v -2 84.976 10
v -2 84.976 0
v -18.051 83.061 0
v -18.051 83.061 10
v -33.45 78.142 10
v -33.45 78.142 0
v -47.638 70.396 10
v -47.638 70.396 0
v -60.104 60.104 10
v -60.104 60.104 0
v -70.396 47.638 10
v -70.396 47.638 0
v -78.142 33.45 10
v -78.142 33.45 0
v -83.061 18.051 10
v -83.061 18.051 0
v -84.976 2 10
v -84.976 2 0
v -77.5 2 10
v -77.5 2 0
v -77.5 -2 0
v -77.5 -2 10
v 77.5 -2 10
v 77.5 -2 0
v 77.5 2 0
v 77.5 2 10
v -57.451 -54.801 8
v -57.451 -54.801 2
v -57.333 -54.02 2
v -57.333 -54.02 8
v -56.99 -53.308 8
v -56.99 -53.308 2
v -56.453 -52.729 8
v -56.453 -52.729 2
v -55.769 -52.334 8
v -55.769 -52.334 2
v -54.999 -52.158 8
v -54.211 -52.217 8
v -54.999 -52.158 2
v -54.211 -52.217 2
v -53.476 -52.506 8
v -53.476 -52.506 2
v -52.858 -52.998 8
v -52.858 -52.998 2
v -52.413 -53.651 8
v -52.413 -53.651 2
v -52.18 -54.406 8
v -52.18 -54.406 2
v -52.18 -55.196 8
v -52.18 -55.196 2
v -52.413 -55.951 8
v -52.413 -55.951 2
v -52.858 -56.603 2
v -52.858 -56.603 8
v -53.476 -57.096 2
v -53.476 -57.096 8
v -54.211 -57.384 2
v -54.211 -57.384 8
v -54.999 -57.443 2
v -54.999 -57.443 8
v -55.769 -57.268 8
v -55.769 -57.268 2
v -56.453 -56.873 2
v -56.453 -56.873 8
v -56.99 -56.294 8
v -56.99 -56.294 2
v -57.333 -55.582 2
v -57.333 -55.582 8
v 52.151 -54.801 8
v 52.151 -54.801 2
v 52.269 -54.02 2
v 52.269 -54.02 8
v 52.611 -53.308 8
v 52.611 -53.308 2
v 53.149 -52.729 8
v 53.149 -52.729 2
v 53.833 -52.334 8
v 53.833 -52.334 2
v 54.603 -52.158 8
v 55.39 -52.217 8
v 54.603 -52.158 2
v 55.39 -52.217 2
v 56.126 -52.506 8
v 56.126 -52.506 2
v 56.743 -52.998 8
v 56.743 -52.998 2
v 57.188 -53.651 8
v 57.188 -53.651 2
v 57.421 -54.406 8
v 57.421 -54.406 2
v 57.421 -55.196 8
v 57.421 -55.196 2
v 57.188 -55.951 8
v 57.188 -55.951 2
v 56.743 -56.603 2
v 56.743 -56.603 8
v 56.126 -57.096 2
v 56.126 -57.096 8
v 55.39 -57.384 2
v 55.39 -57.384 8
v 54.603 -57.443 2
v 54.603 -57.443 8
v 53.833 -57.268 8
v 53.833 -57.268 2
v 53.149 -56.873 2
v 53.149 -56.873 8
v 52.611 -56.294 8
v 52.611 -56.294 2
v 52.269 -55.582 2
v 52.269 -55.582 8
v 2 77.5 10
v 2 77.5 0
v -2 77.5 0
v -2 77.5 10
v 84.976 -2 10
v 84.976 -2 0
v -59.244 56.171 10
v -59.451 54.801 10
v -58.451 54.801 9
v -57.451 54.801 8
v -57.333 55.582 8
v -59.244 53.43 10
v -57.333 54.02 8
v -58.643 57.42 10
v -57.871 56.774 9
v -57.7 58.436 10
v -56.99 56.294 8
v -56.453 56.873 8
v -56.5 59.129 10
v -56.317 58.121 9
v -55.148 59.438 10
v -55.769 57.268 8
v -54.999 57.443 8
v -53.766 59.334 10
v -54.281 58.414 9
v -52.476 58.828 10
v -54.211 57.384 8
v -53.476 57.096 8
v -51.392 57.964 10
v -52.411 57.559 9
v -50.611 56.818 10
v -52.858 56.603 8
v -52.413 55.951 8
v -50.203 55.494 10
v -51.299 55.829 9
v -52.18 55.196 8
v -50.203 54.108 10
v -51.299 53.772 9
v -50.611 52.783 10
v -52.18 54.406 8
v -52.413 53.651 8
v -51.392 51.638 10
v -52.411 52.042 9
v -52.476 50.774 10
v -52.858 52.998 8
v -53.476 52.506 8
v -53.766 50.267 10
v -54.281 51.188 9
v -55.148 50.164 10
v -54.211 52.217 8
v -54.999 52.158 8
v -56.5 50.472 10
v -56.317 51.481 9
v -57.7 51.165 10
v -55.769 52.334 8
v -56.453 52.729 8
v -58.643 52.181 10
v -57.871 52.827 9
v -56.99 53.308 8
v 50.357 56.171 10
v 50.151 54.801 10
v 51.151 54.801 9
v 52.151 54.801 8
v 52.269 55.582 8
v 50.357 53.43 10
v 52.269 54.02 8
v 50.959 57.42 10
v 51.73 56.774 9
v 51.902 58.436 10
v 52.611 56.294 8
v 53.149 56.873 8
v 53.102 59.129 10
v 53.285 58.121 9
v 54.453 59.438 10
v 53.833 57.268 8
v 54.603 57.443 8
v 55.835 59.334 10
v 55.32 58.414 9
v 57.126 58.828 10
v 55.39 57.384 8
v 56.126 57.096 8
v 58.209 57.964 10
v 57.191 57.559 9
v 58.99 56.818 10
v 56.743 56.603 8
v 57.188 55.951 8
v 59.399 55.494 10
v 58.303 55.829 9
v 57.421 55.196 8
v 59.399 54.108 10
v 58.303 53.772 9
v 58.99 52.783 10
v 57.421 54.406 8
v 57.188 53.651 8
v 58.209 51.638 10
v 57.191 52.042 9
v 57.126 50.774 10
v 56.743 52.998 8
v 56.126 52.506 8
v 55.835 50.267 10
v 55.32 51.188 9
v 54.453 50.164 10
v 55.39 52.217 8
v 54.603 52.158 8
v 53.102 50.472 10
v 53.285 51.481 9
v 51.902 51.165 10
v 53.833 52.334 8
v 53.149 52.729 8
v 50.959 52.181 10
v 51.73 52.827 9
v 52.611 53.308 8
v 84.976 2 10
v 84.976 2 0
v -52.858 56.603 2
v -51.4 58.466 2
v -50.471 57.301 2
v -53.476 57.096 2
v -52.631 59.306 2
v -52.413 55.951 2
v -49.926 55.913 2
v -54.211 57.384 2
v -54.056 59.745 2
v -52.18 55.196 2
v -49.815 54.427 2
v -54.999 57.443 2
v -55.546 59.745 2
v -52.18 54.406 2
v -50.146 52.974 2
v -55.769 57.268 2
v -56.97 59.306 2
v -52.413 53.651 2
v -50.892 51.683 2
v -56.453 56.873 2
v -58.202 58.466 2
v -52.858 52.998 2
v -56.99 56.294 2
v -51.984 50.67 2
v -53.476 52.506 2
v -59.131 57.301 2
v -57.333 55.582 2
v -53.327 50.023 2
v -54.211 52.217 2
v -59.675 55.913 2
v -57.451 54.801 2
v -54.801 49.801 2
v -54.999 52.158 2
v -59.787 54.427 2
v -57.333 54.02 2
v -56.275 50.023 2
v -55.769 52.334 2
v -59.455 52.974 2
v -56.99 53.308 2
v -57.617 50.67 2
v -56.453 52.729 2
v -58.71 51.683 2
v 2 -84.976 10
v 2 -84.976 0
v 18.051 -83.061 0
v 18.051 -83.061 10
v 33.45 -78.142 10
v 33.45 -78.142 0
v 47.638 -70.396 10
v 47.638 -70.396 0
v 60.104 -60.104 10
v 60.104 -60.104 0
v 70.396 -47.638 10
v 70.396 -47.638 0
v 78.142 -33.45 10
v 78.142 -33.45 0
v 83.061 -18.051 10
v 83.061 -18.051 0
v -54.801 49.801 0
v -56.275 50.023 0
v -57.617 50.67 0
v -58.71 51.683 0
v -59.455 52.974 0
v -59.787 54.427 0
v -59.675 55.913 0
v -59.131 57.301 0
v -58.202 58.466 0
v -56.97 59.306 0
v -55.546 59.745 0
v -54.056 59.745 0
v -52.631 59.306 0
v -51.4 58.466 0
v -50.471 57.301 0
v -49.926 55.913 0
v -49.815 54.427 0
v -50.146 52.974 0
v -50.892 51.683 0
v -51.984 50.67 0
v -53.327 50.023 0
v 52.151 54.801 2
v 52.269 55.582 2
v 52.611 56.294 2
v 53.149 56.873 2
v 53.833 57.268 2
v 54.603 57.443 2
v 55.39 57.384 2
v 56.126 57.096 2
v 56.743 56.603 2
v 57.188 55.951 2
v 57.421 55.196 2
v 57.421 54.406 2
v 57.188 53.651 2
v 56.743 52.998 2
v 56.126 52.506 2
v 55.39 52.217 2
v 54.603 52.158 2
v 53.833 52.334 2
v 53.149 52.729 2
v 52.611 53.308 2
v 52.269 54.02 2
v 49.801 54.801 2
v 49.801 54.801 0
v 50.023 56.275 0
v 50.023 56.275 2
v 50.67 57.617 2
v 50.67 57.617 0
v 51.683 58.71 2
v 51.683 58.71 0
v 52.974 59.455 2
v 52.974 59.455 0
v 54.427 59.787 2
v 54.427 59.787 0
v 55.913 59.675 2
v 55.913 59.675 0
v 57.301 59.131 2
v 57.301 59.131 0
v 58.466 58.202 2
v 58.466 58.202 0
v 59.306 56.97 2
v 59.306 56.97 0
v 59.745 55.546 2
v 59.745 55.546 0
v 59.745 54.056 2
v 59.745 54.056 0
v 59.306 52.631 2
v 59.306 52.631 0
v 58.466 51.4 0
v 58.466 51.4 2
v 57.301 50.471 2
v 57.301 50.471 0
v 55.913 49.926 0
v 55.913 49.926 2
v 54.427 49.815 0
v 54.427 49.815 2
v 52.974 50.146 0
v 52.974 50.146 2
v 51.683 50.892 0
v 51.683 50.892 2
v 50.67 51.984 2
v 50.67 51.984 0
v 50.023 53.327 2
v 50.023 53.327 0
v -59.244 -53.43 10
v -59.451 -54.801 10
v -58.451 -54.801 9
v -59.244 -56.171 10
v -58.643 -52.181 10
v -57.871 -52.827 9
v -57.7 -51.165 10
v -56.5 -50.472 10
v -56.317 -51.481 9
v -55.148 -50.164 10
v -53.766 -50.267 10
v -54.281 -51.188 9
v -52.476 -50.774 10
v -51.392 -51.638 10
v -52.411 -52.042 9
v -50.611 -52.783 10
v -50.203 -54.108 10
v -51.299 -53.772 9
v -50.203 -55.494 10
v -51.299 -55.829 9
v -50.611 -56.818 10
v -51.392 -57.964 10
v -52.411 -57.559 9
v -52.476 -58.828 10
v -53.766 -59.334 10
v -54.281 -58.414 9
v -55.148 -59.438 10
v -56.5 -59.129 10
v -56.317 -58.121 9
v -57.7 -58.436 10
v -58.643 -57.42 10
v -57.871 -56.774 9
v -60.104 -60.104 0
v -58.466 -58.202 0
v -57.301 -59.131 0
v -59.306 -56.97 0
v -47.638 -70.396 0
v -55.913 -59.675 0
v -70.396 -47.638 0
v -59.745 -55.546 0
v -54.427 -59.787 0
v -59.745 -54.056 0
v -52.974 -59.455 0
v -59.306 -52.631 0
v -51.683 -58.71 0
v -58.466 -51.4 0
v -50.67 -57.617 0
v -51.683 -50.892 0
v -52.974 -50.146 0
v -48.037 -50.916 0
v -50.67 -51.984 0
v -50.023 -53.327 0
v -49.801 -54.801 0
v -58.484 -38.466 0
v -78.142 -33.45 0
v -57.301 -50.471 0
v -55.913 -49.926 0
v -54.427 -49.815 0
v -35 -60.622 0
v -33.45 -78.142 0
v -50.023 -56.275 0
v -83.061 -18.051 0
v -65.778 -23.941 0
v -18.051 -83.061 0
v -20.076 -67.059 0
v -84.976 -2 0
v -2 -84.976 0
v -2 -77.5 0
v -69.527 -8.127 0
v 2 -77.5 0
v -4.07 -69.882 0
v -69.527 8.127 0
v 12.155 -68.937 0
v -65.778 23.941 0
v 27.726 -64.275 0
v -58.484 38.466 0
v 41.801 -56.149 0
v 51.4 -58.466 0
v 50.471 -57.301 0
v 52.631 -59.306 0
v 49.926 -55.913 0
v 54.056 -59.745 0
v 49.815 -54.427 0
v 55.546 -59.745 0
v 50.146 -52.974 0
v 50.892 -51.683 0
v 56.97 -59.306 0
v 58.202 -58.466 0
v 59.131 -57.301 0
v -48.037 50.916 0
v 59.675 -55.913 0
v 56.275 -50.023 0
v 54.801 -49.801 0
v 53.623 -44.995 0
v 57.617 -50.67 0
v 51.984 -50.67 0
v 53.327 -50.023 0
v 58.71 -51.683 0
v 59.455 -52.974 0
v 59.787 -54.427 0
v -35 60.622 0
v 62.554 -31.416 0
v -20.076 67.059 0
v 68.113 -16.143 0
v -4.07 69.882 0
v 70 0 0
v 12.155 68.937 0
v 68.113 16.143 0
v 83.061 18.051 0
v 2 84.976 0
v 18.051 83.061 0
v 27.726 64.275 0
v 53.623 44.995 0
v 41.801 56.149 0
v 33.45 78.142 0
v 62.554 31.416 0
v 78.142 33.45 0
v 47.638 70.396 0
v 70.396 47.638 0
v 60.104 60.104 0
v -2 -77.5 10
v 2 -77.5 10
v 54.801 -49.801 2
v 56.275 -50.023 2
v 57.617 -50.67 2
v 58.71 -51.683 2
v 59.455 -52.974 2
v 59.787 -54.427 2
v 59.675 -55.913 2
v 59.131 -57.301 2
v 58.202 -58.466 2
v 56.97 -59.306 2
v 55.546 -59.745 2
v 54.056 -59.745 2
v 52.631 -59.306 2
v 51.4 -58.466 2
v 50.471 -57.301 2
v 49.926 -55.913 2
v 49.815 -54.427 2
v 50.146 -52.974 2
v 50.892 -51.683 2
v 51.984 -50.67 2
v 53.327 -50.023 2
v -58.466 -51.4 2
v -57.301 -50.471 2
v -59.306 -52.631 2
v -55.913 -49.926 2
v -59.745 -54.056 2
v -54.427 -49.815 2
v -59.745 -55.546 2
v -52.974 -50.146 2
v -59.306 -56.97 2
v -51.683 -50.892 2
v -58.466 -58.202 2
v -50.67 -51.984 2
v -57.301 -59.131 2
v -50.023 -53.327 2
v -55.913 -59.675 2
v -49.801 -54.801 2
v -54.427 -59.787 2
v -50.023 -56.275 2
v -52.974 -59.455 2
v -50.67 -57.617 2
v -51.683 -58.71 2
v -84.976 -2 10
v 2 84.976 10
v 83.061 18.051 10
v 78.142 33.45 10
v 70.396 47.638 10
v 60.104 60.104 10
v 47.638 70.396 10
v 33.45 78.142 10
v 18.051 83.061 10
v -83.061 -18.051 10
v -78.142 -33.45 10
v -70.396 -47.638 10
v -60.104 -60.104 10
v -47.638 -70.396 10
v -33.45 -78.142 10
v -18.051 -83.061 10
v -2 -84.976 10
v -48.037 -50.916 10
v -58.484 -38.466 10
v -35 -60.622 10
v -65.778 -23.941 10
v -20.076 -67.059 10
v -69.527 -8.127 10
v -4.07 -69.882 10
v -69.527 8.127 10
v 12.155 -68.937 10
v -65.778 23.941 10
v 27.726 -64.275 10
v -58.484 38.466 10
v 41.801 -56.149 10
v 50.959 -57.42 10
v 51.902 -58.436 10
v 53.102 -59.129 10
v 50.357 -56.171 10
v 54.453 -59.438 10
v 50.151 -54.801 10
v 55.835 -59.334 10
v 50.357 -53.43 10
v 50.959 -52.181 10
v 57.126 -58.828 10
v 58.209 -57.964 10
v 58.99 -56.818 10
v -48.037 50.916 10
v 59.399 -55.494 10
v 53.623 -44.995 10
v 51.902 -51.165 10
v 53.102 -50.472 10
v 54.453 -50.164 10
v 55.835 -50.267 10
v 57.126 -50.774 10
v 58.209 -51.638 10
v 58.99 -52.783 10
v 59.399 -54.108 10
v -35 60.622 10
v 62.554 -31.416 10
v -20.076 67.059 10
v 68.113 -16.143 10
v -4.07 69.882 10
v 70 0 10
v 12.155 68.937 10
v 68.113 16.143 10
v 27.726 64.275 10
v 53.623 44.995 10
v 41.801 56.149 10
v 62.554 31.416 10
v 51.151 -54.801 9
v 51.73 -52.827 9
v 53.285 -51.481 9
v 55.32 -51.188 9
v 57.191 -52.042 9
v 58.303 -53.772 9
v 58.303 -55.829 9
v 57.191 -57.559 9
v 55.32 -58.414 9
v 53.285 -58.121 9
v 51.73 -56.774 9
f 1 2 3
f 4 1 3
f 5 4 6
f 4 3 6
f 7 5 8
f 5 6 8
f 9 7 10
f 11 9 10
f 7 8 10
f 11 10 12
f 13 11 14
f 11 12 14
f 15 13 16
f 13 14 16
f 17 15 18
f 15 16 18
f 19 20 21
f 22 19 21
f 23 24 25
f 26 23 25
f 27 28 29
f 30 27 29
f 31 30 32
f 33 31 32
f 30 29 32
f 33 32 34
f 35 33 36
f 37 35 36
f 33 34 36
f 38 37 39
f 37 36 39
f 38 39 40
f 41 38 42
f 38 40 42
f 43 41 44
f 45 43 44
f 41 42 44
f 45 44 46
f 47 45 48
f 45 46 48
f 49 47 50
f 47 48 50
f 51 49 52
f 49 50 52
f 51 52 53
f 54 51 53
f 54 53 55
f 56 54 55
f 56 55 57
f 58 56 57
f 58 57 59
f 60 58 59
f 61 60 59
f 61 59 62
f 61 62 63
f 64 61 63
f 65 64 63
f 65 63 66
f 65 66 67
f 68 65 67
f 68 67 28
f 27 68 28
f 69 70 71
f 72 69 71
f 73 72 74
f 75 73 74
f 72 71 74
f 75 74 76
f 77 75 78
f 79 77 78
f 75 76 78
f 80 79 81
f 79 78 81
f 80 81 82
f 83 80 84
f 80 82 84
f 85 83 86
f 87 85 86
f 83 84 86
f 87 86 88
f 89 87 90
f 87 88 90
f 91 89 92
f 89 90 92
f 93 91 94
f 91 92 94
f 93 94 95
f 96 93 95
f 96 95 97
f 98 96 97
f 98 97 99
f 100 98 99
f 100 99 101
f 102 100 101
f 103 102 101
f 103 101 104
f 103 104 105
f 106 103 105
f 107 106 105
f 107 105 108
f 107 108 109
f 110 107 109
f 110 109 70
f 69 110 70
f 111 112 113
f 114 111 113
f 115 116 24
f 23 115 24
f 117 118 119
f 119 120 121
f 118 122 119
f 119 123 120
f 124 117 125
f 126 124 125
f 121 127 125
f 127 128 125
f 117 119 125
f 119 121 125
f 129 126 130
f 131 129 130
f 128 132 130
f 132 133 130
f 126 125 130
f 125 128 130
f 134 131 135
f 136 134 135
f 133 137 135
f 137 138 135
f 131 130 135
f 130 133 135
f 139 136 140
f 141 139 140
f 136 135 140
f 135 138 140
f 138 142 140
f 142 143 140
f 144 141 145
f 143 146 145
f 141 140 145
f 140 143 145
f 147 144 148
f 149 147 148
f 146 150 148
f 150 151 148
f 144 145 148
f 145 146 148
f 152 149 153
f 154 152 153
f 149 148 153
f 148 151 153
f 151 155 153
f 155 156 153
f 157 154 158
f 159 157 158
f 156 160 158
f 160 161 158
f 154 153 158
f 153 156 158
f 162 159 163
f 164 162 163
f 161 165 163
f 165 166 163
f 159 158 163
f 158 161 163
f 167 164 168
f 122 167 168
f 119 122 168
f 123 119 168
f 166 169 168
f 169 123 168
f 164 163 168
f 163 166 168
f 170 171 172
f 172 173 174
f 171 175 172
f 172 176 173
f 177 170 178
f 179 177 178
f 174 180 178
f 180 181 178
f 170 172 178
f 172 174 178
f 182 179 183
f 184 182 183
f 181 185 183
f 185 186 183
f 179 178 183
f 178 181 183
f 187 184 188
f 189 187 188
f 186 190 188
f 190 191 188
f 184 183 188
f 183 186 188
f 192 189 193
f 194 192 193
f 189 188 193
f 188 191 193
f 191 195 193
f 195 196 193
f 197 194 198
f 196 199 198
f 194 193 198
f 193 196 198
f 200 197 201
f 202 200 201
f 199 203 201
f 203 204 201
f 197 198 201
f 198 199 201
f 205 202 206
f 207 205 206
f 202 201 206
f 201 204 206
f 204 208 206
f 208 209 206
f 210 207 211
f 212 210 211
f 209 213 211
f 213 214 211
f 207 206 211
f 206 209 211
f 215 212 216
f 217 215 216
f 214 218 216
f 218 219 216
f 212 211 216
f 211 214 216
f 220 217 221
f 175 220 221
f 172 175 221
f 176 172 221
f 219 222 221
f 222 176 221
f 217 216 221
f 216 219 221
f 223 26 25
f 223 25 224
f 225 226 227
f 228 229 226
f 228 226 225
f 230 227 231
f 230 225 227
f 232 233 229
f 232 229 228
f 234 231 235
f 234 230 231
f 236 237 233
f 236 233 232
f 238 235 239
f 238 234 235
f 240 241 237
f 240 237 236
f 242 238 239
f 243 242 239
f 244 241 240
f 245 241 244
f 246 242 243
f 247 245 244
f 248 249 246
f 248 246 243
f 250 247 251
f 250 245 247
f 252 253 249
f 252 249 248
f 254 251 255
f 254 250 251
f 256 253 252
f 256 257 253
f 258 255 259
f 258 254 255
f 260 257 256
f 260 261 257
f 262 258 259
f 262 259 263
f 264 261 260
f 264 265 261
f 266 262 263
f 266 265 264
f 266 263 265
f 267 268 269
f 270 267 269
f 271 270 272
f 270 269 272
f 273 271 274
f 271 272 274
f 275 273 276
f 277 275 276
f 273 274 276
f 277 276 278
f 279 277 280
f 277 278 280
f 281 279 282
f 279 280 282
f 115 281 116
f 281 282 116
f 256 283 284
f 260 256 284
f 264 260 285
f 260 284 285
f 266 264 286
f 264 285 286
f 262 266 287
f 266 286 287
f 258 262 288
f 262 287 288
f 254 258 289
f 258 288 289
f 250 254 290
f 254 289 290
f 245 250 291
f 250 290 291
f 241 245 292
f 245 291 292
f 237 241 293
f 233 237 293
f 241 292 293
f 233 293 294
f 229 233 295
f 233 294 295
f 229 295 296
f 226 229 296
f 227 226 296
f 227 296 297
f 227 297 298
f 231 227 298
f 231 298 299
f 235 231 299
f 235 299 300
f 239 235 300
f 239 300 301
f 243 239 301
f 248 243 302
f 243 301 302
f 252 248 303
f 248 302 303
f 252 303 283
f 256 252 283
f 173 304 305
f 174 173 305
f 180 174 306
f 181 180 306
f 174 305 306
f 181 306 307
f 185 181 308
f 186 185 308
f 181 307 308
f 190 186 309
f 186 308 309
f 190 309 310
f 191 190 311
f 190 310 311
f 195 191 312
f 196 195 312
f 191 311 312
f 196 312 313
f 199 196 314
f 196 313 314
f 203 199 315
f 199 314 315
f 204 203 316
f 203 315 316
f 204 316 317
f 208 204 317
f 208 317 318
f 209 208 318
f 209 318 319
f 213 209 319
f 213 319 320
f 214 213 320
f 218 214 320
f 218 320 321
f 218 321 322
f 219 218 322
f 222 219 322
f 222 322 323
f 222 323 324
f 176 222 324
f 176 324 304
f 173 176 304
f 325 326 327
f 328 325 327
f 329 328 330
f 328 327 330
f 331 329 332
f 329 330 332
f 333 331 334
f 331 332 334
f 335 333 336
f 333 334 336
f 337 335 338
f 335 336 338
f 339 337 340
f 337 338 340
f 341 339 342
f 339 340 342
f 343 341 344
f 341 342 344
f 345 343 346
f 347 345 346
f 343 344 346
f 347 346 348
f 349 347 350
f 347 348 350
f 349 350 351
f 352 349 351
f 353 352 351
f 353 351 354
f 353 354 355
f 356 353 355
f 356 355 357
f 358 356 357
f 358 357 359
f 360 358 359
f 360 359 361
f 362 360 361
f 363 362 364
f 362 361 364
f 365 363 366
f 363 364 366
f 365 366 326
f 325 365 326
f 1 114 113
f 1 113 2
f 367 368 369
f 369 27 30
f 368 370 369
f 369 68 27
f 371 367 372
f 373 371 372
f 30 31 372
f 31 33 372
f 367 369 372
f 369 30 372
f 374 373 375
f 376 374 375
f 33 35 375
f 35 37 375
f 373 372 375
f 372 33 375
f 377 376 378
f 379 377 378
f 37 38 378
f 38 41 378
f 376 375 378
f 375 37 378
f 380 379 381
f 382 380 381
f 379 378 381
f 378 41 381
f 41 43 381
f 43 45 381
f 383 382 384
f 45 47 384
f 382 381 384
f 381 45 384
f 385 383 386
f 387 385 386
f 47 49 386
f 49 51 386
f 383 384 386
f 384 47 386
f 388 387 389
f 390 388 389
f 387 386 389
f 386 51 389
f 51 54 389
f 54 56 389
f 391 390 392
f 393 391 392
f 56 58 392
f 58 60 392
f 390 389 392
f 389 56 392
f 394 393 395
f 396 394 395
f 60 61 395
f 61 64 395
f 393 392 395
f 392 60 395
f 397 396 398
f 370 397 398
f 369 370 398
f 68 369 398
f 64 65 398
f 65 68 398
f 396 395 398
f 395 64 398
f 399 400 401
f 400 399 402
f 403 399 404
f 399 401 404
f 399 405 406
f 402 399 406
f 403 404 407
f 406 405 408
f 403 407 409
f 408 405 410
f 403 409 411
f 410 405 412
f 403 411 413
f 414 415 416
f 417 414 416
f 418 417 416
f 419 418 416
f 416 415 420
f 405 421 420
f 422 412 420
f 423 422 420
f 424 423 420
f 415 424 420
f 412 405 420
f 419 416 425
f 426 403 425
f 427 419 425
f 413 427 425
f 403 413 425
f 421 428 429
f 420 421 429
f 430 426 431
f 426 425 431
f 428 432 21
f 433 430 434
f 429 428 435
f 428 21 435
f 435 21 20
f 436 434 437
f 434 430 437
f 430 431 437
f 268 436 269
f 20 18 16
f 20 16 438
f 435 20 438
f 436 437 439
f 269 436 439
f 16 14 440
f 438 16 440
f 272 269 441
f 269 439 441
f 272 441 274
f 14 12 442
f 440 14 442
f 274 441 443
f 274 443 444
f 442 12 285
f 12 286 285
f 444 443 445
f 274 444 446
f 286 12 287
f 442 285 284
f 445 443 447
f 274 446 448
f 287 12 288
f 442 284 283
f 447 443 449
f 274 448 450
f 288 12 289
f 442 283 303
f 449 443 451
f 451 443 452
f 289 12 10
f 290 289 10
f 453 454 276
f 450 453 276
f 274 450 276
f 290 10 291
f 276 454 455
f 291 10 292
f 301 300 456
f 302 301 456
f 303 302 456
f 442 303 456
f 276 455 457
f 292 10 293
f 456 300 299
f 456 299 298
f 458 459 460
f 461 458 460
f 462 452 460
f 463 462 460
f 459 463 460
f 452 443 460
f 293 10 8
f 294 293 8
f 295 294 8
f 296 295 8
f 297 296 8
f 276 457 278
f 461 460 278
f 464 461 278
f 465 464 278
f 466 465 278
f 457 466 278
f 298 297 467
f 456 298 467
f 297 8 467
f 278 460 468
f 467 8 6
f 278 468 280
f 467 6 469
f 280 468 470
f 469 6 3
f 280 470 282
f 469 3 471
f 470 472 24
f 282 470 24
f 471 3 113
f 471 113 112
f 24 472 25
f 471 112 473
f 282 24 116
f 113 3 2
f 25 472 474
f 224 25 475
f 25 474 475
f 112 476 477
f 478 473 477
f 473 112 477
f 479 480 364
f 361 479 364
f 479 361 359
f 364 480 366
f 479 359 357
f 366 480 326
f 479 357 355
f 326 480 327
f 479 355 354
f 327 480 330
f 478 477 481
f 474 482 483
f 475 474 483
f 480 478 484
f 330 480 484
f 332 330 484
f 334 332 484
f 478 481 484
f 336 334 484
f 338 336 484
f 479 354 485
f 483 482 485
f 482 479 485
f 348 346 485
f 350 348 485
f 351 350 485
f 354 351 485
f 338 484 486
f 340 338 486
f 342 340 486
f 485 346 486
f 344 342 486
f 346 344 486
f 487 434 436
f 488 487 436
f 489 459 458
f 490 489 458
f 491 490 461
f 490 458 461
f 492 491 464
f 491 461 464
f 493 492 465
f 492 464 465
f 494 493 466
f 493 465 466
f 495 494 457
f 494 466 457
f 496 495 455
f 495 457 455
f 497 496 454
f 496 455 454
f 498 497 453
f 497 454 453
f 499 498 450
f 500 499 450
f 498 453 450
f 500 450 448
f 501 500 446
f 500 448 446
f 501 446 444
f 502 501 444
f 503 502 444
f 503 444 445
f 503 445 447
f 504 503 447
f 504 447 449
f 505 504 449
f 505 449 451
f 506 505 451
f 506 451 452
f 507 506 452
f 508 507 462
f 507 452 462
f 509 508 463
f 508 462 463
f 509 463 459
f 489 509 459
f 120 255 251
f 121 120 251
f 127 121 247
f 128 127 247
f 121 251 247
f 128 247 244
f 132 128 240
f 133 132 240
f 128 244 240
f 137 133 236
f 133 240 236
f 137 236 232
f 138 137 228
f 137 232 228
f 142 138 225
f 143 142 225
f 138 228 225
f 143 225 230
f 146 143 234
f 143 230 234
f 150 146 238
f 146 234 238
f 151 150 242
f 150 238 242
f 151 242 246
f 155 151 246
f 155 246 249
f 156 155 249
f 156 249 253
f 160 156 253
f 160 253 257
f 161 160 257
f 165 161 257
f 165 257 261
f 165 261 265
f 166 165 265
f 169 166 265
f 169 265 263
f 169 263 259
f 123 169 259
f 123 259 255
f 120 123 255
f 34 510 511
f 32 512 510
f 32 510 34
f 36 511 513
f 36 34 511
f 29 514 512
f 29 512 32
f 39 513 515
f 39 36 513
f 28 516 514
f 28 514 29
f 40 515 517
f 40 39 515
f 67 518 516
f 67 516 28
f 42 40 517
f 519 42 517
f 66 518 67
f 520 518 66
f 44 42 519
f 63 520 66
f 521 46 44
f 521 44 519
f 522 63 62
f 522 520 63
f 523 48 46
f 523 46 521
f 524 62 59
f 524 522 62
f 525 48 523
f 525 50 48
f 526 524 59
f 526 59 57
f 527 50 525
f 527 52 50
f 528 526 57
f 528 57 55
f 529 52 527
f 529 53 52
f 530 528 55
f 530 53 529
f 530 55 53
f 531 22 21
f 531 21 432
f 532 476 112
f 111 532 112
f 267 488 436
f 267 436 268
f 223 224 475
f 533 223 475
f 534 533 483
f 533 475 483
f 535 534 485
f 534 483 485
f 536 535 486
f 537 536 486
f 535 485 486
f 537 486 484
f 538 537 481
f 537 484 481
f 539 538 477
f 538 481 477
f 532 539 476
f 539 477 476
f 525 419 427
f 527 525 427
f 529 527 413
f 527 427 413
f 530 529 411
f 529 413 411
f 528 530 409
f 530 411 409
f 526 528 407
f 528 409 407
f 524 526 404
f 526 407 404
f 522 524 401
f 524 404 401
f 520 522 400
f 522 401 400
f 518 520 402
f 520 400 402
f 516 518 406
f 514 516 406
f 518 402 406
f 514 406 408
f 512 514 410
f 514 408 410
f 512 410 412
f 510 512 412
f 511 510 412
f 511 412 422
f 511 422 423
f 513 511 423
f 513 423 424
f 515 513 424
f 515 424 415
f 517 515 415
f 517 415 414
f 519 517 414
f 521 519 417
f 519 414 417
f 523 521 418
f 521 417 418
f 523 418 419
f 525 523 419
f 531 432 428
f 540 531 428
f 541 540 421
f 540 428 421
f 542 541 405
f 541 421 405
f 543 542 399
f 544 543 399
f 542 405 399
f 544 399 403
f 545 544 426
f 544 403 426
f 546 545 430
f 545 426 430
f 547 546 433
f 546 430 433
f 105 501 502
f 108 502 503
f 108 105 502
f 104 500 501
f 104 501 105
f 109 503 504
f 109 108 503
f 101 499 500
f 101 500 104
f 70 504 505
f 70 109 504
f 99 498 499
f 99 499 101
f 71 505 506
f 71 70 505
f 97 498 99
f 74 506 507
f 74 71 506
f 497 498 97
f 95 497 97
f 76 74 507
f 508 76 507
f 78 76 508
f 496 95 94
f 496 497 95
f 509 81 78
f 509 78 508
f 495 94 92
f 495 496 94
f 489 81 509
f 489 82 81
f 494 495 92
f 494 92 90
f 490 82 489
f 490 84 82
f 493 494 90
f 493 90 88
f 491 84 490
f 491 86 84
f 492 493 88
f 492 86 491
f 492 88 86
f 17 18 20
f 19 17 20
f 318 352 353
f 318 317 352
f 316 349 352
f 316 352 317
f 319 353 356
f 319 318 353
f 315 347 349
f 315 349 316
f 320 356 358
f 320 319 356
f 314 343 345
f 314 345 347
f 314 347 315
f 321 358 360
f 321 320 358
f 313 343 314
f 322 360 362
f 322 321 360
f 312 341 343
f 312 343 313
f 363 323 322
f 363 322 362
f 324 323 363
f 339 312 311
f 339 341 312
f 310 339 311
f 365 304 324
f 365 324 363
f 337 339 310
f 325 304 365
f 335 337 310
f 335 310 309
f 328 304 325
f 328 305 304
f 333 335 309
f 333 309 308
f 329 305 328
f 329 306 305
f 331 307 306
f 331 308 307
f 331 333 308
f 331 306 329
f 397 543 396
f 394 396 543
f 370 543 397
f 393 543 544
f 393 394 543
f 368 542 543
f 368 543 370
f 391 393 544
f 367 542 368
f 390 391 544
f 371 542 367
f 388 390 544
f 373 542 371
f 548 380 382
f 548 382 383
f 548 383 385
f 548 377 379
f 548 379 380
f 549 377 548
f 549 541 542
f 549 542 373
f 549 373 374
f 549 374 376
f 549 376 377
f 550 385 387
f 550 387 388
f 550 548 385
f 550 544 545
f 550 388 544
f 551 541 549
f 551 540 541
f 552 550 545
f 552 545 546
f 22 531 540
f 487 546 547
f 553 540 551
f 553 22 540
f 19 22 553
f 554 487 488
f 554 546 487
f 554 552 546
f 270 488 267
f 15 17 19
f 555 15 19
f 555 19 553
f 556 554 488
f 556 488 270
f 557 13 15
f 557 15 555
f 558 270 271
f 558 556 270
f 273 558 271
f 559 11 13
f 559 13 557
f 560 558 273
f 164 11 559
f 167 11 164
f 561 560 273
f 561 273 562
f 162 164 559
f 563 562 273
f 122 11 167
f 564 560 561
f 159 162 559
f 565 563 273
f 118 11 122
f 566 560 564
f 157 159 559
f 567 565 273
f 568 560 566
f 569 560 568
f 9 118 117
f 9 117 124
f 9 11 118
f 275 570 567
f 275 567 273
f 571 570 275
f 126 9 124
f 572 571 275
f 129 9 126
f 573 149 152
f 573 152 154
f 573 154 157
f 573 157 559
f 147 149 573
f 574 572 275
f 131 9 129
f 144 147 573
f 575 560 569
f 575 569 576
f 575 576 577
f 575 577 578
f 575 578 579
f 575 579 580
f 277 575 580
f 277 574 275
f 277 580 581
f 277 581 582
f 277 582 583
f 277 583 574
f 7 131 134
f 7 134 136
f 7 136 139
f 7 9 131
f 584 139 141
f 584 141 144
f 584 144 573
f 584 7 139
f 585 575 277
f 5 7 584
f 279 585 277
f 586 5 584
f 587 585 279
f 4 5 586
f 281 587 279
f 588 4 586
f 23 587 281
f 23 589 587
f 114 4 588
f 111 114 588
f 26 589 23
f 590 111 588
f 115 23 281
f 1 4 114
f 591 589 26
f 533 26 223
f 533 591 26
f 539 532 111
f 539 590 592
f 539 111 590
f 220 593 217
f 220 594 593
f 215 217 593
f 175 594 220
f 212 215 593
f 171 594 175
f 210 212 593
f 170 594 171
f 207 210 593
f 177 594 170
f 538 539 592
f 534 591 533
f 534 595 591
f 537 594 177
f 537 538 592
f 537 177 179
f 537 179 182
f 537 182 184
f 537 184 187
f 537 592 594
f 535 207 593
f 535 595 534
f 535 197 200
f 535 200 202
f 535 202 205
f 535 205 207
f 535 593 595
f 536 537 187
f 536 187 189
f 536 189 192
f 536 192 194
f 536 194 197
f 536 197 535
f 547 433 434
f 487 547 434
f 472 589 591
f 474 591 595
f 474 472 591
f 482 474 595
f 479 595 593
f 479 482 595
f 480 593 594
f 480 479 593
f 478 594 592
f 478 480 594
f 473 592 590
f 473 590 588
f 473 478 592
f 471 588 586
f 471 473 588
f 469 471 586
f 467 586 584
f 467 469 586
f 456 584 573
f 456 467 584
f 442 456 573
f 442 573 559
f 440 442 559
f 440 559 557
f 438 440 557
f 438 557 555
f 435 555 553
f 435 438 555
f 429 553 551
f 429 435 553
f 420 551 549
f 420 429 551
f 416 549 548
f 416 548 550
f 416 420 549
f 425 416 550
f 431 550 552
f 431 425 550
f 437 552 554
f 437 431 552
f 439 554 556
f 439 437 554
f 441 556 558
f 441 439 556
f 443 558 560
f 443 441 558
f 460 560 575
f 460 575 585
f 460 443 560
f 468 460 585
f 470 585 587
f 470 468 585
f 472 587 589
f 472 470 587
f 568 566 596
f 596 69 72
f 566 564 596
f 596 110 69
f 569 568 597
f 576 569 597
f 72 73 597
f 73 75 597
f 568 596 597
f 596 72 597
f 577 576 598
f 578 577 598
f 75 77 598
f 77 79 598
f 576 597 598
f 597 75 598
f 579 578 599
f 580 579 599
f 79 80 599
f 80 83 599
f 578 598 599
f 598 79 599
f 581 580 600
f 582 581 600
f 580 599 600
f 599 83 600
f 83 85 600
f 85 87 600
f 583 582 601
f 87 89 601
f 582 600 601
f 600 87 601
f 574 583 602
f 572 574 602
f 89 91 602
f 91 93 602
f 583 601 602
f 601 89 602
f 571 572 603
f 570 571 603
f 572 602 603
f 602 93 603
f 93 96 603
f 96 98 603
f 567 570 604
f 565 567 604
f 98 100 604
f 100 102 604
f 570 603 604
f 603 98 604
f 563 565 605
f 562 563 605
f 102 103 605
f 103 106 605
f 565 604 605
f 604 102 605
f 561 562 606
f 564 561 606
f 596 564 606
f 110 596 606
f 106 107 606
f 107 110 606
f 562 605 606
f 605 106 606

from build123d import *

# Parameters (mm, degrees)
SKETCH1_R                  = 70
BOSS_EXTRUDE1_DEPTH        = 10
SKETCH2_R                  = 2.65
WYTNIJ_WYCI_GNI_CIE1_DEPTH = 10
SZKIC1_R                   = 5
WYTNIJ_WYCI_GNI_CIE2_DEPTH = 2
SZYK_KO_OWY1_COUNT         = 4
SFAZOWANIE1_SIZE           = 2


with BuildPart() as part:
    # Sketch1 → Boss-Extrude1 (new body)
    with BuildSketch(Plane.XY):
        with BuildLine():
            Line((84.976467331, -2), (77.499555144, -2))
            Line((77.499555144, -2), (77.499555144, 2))
            Line((77.499555144, 2), (84.976467331, 2))
            ThreePointArc((84.976467331, 2), (60.104076401, 60.104076401), (2, 84.976467331))
            Line((2, 84.976467331), (2, 77.499555144))
            Line((2, 77.499555144), (-2, 77.499555144))
            Line((-2, 77.499555144), (-2, 84.976467331))
            ThreePointArc((-2, 84.976467331), (-60.104076401, 60.104076401), (-84.976467331, 2))
            Line((-84.976467331, 2), (-77.499555144, 2))
            Line((-77.499555144, 2), (-77.499555144, -2))
            Line((-77.499555144, -2), (-84.976467331, -2))
            ThreePointArc((-84.976467331, -2), (-60.104076401, -60.104076401), (-2, -84.976467331))
            Line((-2, -84.976467331), (-2, -77.499555144))
            Line((-2, -77.499555144), (2, -77.499555144))
            Line((2, -77.499555144), (2, -84.976467331))
            ThreePointArc((2, -84.976467331), (60.104076401, -60.104076401), (84.976467331, -2))
        make_face()
        Circle(SKETCH1_R, mode=Mode.SUBTRACT)
    extrude(amount=BOSS_EXTRUDE1_DEPTH)

    # Sketch2 → Wytnij-wyciągnięcie1 (cut)
    with BuildSketch(Plane(origin=(0, 0, 0), x_dir=(-1, 0, 0), z_dir=(0, 0, -1))):
        with Locations((-54.800775542, 54.800775542)):
            Circle(SKETCH2_R)
        with Locations((54.800775542, 54.800775542)):
            Circle(SKETCH2_R)
        with Locations((54.800775542, -54.800775542)):
            Circle(SKETCH2_R)
        with Locations((-54.800775542, -54.800775542)):
            Circle(SKETCH2_R)
    extrude(amount=-WYTNIJ_WYCI_GNI_CIE1_DEPTH, mode=Mode.SUBTRACT)

    # Szkic1 → Wytnij-wyciągnięcie2 (cut)
    with BuildSketch(Plane(origin=(0, 0, 0), x_dir=(-1, 0, 0), z_dir=(0, 0, -1))):
        with Locations((-54.800775542, 54.800775542)):
            Circle(SZKIC1_R)
    wytnij_wyci_gni_cie2 = extrude(amount=-WYTNIJ_WYCI_GNI_CIE2_DEPTH, mode=Mode.SUBTRACT)

    # Szyk kołowy1: Wytnij-wyciągnięcie2 ×4 about axis
    szyk_ko_owy1_axis = Axis((0, 0, 0), (0, 0, 1))
    for i in range(1, SZYK_KO_OWY1_COUNT):
        add(wytnij_wyci_gni_cie2.rotate(szyk_ko_owy1_axis, i * 360 / SZYK_KO_OWY1_COUNT), mode=Mode.SUBTRACT)

    # Sfazowanie1
    sfazowanie1_edges = [part.edges().sort_by_distance(p)[0] for p in [
        (57.450775542, -54.800775542, 10),
        (-52.150775542, -54.800775542, 10),
        (-52.150775542, 54.800775542, 10),
        (57.450775542, 54.800775542, 10),
    ]]
    chamfer(sfazowanie1_edges, length=SFAZOWANIE1_SIZE)


solid = part.part
